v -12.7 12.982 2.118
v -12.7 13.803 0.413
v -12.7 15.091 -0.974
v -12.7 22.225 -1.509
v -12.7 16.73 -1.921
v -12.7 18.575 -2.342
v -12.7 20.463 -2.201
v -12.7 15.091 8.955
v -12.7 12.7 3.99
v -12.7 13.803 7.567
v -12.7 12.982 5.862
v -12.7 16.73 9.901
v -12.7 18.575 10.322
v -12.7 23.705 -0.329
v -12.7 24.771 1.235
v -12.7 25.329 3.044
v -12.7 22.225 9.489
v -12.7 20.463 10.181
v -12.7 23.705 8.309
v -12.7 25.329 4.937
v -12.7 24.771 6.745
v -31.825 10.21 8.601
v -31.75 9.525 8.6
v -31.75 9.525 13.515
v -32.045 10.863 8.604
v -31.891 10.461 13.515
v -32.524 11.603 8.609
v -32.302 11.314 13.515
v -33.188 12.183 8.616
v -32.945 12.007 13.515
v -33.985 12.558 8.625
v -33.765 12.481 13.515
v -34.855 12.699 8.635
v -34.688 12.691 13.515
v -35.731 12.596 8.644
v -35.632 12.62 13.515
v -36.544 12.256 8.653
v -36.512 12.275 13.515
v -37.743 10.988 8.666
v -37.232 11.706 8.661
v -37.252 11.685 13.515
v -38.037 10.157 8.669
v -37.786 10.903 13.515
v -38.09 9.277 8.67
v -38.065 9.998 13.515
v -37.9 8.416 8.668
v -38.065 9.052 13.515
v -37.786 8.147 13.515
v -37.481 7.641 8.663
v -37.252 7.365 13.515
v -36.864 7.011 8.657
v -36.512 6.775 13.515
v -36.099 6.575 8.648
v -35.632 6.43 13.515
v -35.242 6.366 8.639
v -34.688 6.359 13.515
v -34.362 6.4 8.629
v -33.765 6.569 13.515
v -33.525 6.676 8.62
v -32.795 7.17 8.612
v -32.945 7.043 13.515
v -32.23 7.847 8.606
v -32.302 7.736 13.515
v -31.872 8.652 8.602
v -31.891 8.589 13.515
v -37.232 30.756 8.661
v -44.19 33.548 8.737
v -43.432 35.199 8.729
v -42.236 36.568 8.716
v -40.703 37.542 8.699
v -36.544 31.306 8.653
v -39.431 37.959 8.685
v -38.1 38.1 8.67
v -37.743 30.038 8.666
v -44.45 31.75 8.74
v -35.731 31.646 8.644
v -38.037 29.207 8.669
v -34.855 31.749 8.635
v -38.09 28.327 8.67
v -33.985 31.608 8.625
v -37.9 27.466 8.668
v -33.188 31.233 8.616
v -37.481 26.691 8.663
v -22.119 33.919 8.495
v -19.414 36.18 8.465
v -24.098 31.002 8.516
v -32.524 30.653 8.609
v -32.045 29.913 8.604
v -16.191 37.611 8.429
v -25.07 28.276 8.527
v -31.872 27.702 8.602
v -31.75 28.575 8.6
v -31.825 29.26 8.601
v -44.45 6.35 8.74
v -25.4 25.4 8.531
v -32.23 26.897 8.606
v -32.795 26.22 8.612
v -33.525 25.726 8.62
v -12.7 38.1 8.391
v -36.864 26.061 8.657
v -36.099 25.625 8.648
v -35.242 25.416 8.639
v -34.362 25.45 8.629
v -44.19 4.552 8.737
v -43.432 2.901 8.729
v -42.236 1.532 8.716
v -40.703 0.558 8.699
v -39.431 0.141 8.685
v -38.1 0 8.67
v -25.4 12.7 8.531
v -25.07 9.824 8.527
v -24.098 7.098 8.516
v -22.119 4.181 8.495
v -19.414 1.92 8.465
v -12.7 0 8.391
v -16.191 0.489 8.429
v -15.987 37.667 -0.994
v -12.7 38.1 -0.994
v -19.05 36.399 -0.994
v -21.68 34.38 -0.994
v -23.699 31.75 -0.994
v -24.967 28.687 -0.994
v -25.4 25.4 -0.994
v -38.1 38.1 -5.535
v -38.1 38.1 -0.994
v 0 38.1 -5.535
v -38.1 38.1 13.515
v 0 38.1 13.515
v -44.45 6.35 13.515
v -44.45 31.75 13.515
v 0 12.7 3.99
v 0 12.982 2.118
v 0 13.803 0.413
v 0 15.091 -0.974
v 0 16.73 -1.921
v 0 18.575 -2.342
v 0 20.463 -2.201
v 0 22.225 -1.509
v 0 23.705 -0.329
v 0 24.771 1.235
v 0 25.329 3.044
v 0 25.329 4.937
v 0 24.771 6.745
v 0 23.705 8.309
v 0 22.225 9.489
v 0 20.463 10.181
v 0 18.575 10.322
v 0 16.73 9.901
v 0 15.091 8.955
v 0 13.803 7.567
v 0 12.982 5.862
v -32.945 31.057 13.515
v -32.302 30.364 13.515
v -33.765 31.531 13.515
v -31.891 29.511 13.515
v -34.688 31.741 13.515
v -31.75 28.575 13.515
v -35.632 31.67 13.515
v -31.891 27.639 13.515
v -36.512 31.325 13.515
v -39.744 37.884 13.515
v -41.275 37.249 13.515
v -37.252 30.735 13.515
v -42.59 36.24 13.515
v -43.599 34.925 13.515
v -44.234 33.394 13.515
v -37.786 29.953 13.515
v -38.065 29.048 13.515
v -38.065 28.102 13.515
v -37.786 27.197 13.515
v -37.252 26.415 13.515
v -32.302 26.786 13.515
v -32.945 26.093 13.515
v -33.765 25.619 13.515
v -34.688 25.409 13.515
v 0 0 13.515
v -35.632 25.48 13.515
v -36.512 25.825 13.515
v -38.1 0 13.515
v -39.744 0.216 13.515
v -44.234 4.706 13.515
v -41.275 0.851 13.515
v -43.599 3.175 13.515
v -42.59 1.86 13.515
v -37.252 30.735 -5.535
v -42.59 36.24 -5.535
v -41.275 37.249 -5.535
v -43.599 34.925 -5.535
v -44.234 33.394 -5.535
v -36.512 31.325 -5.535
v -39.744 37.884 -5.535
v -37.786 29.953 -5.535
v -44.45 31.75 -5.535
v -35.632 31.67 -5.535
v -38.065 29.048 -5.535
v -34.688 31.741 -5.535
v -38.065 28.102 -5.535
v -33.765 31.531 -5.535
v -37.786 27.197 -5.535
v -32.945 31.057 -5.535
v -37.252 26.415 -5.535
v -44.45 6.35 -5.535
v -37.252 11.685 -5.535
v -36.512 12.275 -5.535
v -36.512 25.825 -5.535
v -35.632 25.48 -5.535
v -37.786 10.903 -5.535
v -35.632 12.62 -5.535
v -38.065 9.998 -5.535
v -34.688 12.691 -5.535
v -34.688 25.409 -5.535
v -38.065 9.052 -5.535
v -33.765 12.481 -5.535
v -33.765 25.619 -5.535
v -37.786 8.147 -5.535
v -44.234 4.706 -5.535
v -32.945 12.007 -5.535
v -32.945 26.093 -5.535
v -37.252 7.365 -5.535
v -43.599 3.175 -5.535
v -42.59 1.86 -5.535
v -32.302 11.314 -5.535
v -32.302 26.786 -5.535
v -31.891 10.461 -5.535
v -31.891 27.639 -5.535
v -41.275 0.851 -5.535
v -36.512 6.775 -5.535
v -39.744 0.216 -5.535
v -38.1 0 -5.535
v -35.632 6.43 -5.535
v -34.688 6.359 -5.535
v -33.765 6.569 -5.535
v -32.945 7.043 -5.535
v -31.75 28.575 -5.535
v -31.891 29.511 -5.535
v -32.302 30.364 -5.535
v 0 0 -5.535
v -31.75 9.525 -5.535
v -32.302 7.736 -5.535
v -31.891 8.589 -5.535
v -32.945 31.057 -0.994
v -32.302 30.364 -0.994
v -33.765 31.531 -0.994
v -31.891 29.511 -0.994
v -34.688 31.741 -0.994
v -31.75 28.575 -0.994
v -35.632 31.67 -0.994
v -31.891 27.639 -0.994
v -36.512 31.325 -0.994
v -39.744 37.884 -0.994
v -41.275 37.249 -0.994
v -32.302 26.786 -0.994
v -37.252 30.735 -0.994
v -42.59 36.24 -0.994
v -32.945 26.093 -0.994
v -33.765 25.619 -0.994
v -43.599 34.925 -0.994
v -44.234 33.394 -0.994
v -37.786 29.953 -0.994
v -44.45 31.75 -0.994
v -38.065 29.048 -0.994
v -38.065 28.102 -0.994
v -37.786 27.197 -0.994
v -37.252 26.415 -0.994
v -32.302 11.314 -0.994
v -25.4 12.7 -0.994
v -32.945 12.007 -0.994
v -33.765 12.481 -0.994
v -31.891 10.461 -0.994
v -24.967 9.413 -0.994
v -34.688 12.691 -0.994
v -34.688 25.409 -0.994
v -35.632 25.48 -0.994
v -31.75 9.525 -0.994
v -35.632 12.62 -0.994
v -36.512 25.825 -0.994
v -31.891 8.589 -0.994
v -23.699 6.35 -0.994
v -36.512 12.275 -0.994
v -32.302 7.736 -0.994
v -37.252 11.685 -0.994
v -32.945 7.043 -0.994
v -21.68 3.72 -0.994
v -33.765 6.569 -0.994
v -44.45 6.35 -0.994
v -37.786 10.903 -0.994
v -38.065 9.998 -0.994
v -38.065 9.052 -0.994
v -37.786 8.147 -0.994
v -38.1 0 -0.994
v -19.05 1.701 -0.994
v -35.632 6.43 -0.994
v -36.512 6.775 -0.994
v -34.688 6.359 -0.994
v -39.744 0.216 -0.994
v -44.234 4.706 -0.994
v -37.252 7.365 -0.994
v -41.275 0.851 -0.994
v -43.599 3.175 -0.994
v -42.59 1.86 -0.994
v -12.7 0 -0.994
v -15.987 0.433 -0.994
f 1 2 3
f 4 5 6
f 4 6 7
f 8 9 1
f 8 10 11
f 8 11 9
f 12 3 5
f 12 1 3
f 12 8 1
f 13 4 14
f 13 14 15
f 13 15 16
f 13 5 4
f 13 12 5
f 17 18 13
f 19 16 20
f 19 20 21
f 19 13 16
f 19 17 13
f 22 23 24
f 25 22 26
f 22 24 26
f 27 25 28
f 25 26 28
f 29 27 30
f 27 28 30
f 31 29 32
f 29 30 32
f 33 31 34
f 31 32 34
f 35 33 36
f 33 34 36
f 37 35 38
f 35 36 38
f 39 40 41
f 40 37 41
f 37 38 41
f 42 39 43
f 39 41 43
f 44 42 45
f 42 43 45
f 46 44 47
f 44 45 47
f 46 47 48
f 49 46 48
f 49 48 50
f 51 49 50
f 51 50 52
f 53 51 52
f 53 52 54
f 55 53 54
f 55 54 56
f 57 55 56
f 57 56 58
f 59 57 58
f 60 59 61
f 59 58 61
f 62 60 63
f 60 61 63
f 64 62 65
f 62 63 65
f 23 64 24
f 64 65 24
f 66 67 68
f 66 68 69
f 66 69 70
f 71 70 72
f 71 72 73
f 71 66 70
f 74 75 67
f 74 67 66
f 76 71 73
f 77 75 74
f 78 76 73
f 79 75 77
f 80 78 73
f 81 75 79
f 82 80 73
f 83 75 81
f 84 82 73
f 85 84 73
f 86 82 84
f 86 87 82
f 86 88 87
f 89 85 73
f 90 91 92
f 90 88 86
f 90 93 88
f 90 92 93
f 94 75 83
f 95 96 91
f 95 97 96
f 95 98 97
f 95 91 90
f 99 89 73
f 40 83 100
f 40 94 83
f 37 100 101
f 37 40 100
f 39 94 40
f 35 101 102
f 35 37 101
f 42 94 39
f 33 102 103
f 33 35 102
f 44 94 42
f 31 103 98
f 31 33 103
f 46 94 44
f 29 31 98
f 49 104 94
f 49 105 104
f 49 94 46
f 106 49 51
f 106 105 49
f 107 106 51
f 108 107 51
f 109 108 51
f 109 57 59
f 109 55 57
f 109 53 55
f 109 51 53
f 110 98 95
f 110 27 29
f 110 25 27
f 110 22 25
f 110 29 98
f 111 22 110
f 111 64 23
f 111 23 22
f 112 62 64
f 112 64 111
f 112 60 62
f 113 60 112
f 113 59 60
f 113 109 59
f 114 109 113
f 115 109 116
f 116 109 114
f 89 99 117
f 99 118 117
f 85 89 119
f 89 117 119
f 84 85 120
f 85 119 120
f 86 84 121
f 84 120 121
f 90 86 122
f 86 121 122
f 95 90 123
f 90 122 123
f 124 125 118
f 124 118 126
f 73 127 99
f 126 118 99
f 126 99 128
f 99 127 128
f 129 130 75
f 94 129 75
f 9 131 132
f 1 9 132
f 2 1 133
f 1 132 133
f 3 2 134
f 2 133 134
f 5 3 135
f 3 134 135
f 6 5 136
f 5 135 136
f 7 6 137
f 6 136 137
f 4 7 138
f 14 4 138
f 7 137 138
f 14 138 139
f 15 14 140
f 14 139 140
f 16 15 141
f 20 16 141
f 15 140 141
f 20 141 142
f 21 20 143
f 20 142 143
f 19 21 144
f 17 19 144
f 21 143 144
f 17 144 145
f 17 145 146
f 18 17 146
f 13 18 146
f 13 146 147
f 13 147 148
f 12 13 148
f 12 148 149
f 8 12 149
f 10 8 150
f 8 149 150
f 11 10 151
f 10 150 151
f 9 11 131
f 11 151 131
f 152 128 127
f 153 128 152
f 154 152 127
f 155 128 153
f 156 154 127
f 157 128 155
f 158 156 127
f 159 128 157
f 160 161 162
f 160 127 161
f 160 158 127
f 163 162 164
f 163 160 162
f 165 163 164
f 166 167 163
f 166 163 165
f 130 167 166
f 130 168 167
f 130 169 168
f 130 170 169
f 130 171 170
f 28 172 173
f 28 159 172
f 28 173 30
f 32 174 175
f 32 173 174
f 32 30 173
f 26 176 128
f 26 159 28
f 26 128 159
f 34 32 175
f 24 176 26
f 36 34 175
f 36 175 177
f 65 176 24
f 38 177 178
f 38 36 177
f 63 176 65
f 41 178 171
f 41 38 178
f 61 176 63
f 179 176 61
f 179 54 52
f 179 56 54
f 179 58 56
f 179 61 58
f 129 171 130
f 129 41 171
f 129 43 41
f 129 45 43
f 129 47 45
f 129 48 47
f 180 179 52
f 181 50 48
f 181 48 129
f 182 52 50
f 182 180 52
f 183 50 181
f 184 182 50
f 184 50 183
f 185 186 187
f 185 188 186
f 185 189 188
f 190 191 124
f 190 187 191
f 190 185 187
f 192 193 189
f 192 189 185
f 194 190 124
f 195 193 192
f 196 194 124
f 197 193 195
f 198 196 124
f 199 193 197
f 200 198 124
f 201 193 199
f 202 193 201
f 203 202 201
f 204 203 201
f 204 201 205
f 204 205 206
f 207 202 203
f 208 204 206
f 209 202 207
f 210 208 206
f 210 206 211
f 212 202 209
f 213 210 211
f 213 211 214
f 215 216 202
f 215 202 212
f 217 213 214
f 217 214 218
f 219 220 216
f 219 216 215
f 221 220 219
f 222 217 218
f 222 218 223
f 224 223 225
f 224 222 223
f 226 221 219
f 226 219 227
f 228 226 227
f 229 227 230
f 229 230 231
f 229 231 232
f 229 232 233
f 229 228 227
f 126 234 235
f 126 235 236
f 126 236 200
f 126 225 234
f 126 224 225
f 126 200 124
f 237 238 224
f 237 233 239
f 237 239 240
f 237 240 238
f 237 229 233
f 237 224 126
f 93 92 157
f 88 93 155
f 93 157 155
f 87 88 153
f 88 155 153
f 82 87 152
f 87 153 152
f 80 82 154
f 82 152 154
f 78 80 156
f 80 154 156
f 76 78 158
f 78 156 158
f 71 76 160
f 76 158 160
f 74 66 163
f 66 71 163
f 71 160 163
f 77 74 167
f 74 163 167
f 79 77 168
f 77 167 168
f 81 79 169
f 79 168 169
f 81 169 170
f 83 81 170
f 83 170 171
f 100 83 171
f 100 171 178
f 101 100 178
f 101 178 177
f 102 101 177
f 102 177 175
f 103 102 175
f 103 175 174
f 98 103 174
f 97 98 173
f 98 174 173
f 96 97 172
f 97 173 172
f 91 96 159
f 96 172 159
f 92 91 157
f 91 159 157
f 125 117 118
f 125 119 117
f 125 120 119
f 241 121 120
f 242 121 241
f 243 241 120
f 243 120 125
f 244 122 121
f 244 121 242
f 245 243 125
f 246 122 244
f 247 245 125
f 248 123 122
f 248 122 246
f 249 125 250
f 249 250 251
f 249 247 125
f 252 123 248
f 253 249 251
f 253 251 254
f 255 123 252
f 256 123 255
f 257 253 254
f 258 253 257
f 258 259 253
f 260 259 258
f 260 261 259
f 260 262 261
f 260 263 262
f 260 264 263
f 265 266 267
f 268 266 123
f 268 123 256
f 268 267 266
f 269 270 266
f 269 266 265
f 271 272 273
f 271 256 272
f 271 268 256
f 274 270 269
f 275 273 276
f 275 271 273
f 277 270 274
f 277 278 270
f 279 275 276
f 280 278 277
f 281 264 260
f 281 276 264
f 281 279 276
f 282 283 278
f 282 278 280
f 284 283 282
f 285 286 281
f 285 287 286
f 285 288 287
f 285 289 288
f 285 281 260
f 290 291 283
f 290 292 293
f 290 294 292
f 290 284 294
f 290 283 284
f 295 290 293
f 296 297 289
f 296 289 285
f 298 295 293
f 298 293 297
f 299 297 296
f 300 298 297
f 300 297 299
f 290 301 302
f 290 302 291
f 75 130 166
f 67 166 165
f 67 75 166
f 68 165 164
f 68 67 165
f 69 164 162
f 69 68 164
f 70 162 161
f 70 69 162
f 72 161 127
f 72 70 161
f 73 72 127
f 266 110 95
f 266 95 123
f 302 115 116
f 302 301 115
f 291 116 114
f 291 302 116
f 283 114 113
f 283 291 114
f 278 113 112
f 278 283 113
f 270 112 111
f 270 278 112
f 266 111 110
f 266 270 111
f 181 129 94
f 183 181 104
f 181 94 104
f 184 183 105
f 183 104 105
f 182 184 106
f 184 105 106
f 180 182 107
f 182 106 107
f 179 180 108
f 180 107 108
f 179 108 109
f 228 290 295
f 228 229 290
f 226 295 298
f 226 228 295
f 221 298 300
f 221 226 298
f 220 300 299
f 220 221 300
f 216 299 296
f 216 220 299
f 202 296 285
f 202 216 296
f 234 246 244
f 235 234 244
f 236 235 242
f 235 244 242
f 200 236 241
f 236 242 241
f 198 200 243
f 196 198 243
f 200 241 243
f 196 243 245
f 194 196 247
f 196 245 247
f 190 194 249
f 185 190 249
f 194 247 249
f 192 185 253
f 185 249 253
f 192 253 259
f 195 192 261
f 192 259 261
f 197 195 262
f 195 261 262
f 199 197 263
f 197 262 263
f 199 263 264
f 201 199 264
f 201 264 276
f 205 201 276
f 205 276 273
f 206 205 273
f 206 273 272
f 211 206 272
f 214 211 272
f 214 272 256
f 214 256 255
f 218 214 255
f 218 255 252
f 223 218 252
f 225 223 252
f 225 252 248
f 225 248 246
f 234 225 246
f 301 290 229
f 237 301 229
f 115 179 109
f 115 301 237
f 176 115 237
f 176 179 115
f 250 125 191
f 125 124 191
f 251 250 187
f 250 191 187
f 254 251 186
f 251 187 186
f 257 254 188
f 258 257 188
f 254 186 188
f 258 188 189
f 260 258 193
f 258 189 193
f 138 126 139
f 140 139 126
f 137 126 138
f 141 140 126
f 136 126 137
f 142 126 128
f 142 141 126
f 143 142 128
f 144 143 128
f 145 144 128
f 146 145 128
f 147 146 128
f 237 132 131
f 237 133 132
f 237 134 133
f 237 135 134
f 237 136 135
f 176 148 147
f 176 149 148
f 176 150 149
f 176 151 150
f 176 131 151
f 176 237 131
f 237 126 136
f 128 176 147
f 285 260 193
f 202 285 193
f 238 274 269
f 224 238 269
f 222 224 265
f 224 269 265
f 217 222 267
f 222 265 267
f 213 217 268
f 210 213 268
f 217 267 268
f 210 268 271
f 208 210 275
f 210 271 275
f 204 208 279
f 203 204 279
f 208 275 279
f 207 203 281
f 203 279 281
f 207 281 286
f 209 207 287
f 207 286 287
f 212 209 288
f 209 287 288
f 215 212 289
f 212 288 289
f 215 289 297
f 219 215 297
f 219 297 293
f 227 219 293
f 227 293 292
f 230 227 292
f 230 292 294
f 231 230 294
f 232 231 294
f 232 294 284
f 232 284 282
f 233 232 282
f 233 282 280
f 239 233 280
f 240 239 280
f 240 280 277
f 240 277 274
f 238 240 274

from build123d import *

# Parameters (mm, degrees)
F1_DEPTH = 38.1
F2_R     = 3.175
F3_DEPTH = 177.8
F4_R     = 6.35
F6_DEPTH = 12.7
F7_R     = 12.7


with BuildPart() as f1:
    # F0 (on Front) → F1 (new body)
    with BuildSketch(Plane.XZ):
        Polygon((-44.45, 13.515173), (-44.45, 8.739973), (-25.4, 8.530632), (-25.4, -0.994368), (-44.45, -0.994368), (-44.45, -5.534827), (0, -5.534827), (0, 13.515173), align=None)
    extrude(amount=-F1_DEPTH)

    # F2 (on face) → F3 (cut)
    with BuildSketch(Plane.XY.offset(13.515173)):
        with Locations((-34.925, 28.575)):
            Circle(F2_R)
        with Locations((-34.925, 9.525)):
            Circle(F2_R)
    extrude(amount=-F3_DEPTH, mode=Mode.SUBTRACT)

    # F4
    f4_edges = [f1.edges().sort_by_distance(p)[0] for p in [
        (-44.45, 38.1, 11.127573),
        (-44.45, 38.1, -3.264598),
        (-44.45, 0, 11.127573),
        (-44.45, 0, -3.264598),
    ]]
    fillet(f4_edges, radius=F4_R)

    # F5 (on face) → F6 (cut)
    with BuildSketch(Plane.YZ):
        with BuildLine():
            ThreePointArc((25.4, 3.990173), (19.05, 10.340173), (12.7, 3.990173))
            Line((12.7, 3.990173), (25.4, 3.990173))
        make_face()
        with BuildLine():
            Line((25.4, 3.990173), (12.7, 3.990173))
            ThreePointArc((12.7, 3.990173), (19.05, -2.359827), (25.4, 3.990173))
        make_face()
    extrude(amount=-F6_DEPTH, mode=Mode.SUBTRACT)

    # F7
    f7_edges = [f1.edges().sort_by_distance(p)[0] for p in [
        (-25.4, 0, 3.768132),
        (-25.4, 38.1, 3.768132),
    ]]
    fillet(f7_edges, radius=F7_R)


solid = f1.part
